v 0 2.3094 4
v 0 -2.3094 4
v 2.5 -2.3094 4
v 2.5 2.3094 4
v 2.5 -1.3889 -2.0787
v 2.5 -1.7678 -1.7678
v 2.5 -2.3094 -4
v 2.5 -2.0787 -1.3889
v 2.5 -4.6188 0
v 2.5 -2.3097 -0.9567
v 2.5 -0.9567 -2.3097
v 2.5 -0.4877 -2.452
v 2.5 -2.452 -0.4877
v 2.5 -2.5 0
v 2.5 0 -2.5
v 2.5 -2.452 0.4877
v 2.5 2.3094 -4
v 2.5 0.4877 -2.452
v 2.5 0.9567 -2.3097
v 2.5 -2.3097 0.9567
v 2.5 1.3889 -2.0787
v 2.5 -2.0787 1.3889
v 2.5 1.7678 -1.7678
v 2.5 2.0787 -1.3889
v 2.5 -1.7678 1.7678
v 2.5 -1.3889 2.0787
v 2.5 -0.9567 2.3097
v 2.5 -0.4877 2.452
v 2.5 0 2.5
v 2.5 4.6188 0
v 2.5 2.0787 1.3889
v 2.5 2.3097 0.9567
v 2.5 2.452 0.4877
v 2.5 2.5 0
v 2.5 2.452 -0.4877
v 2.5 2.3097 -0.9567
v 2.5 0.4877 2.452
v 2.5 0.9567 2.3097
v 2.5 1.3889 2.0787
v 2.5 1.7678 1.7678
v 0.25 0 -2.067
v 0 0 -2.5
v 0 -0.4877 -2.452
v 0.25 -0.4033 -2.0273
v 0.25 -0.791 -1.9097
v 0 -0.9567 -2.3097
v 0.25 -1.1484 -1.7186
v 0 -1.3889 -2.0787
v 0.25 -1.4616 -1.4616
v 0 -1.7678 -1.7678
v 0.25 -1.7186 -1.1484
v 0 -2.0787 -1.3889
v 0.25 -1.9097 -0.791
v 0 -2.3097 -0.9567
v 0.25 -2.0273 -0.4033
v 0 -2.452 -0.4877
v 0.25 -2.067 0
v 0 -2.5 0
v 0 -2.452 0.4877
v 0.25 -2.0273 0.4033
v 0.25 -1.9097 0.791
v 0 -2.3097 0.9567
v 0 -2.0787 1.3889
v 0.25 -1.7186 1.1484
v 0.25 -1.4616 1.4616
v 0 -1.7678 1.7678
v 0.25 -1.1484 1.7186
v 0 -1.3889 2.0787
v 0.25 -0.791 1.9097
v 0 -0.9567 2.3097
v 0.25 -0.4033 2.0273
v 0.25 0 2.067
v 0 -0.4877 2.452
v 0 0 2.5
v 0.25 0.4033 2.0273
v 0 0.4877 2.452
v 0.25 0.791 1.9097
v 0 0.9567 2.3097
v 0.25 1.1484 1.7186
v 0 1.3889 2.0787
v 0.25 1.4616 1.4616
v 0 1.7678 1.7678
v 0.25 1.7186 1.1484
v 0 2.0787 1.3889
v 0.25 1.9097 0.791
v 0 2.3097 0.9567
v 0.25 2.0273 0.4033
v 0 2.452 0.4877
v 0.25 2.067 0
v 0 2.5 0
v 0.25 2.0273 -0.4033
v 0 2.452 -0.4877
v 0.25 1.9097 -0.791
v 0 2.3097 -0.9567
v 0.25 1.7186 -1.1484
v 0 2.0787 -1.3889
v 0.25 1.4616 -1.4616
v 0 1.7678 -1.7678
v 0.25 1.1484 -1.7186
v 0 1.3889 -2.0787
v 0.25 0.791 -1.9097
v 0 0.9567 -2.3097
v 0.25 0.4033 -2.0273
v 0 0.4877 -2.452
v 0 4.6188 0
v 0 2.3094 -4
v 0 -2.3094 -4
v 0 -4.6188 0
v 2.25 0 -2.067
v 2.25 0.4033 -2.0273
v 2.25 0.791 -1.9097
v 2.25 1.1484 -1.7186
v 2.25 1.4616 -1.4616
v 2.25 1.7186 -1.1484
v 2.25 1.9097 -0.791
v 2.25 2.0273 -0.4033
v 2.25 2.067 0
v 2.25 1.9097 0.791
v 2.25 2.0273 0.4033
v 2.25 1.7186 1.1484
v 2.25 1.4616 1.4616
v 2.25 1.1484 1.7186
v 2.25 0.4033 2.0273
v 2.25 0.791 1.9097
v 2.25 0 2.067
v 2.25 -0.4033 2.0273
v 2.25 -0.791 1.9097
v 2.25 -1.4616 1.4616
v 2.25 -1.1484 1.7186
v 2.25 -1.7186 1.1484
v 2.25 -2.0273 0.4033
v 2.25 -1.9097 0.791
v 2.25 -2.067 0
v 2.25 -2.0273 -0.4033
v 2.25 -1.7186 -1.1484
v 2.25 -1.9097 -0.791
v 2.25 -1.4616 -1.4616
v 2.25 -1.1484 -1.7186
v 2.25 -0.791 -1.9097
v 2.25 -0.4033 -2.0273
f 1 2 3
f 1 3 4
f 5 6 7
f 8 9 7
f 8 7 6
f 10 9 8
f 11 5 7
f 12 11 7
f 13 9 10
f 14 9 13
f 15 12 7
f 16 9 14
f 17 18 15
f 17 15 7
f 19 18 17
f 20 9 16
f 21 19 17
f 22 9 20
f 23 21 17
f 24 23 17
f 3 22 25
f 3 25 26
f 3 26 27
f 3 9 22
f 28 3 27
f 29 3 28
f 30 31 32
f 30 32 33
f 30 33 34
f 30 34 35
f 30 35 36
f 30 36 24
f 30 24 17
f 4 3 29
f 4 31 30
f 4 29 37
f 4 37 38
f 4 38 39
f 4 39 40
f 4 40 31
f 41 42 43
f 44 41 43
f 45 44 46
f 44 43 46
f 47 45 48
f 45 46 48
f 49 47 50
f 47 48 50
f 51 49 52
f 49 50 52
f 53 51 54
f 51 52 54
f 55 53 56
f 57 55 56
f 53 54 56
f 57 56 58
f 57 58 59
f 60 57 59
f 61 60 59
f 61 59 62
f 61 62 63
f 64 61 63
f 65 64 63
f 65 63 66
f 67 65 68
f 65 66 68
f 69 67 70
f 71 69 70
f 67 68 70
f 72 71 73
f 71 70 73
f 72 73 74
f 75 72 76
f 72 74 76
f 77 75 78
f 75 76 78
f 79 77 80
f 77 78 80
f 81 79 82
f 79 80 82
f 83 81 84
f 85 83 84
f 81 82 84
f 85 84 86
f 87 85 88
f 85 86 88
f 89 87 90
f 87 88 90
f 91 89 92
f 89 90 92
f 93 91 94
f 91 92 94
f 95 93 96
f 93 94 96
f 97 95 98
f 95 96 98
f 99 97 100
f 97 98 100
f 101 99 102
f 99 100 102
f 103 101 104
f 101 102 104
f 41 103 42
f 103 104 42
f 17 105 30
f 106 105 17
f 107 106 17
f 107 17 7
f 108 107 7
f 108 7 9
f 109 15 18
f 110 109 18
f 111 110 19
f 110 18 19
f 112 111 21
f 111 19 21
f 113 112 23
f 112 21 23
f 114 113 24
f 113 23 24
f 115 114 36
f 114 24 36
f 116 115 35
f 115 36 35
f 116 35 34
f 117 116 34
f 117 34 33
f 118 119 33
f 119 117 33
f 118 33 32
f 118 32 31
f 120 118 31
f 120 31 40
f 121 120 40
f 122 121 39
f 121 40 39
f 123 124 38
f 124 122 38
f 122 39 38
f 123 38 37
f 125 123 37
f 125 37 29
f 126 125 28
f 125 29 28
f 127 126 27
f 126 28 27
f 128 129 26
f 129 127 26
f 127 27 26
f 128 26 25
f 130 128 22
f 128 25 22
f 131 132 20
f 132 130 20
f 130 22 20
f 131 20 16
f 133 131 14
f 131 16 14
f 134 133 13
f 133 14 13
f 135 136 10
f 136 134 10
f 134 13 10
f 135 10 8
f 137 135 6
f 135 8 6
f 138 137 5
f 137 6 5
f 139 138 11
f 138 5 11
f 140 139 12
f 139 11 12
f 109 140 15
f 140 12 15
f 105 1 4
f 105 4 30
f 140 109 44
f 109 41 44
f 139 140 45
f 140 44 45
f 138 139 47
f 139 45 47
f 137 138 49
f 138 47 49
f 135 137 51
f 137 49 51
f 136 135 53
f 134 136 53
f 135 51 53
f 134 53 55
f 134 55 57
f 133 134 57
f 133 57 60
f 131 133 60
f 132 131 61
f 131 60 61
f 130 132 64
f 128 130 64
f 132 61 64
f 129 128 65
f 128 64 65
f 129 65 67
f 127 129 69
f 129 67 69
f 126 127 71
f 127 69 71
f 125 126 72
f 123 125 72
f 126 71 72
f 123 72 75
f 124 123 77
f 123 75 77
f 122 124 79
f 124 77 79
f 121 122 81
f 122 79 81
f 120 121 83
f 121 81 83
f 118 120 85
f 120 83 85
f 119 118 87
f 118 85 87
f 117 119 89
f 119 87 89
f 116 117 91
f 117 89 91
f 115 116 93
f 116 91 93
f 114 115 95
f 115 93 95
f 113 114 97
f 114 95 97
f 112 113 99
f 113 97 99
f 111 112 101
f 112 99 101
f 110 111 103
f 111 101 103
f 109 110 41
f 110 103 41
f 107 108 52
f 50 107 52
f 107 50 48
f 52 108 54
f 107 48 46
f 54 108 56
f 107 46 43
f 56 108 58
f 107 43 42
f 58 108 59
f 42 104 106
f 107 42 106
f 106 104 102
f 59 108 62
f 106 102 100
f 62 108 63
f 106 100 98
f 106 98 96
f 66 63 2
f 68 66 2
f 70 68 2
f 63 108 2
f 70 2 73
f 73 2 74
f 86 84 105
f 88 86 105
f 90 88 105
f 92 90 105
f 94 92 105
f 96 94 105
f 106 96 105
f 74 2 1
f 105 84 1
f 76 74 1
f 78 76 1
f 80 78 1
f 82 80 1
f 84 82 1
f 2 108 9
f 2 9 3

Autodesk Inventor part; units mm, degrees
ref_plane "YZ Plane" through (0, 0, 0) normal (1, 0, 0) x (0, 1, 0)
ref_plane "XZ Plane" through (0, 0, 0) normal (0, 1, 0) x (-1, 0, 0)
sketch "Boceto1" plane through (0, 0, 0) normal (1, 0, 0) x (0, 1, 0)
  line L0 (2.3094, -4) -> (-2.3094, -4)
  line L1 (-2.3094, -4) -> (-4.6188, 0)
  line L2 (-4.6188, 0) -> (-2.3094, 4)
  line L3 (-2.3094, 4) -> (2.3094, 4)
  line L4 (2.3094, 4) -> (4.6188, 0)
  line L5 (4.6188, 0) -> (2.3094, -4)
  point P0 (0, 0)
  point P1 (0, 0)
  dimension "d0" = 9.2376
extrude "Cuerpo" add sketch "Boceto1" along normal blind 2.5
sketch "Boceto2" plane through (2.5, 0, 0) normal (1, 0, 0) x (0, 0, -1)
  point P0 (0, 0)
hole "Rosca" at (2.5, 0, 0) direction (-1, 0, 0) diameter 4.134 end through all thread size "M5x0.8" class "6H" standard "ISO Metric profile"
chamfer "Chaflán2" distance 0.433 angle 30 1 edges at (2.5, 0, 2.067) measured on face at (2.5, 2.8764, -1.7247)
chamfer "Chaflán1" distance 0.433 angle 30 1 edges at (0, 0, 2.067) measured on face at (0, 2.8764, -1.7247)
ref_plane "Work Plane1" through (-9.9733, 0, 0) normal (0, 0, -1) x (1, 0, 0)
equation "\"d0\" = 1.1547 * SW"
equation "\"d1\" = KOH"
equation "\"d12\" = -0.5 * GD1 + 0.5 * NND"
equation "\"d19\" = -0.5 * GD1 + 0.5 * NND"
equation "\"d10\" = -0.5 * GD1 + 0.5 * NND"
equation "\"d18\" = -0.5 * GD1 + 0.5 * NND"
equation "\"NND\" = 5"
equation "\"KOH\" = 2.5"
equation "\"SW\" = 8"
equation "\"GUL\" = 0.541266 * PTC"
equation "\"THREADDIA\" = 5"
equation "\"TOA\" = 30deg"
equation "\"PTC\" = 0.8"
equation "\"E0\" = 1.155 * SW"
equation "\"GAL\" = 0.541266 * PTC"
equation "\"GD1\" = 4.133975"
properties part number "BS 4183 - M5" material "Acero, suave"
